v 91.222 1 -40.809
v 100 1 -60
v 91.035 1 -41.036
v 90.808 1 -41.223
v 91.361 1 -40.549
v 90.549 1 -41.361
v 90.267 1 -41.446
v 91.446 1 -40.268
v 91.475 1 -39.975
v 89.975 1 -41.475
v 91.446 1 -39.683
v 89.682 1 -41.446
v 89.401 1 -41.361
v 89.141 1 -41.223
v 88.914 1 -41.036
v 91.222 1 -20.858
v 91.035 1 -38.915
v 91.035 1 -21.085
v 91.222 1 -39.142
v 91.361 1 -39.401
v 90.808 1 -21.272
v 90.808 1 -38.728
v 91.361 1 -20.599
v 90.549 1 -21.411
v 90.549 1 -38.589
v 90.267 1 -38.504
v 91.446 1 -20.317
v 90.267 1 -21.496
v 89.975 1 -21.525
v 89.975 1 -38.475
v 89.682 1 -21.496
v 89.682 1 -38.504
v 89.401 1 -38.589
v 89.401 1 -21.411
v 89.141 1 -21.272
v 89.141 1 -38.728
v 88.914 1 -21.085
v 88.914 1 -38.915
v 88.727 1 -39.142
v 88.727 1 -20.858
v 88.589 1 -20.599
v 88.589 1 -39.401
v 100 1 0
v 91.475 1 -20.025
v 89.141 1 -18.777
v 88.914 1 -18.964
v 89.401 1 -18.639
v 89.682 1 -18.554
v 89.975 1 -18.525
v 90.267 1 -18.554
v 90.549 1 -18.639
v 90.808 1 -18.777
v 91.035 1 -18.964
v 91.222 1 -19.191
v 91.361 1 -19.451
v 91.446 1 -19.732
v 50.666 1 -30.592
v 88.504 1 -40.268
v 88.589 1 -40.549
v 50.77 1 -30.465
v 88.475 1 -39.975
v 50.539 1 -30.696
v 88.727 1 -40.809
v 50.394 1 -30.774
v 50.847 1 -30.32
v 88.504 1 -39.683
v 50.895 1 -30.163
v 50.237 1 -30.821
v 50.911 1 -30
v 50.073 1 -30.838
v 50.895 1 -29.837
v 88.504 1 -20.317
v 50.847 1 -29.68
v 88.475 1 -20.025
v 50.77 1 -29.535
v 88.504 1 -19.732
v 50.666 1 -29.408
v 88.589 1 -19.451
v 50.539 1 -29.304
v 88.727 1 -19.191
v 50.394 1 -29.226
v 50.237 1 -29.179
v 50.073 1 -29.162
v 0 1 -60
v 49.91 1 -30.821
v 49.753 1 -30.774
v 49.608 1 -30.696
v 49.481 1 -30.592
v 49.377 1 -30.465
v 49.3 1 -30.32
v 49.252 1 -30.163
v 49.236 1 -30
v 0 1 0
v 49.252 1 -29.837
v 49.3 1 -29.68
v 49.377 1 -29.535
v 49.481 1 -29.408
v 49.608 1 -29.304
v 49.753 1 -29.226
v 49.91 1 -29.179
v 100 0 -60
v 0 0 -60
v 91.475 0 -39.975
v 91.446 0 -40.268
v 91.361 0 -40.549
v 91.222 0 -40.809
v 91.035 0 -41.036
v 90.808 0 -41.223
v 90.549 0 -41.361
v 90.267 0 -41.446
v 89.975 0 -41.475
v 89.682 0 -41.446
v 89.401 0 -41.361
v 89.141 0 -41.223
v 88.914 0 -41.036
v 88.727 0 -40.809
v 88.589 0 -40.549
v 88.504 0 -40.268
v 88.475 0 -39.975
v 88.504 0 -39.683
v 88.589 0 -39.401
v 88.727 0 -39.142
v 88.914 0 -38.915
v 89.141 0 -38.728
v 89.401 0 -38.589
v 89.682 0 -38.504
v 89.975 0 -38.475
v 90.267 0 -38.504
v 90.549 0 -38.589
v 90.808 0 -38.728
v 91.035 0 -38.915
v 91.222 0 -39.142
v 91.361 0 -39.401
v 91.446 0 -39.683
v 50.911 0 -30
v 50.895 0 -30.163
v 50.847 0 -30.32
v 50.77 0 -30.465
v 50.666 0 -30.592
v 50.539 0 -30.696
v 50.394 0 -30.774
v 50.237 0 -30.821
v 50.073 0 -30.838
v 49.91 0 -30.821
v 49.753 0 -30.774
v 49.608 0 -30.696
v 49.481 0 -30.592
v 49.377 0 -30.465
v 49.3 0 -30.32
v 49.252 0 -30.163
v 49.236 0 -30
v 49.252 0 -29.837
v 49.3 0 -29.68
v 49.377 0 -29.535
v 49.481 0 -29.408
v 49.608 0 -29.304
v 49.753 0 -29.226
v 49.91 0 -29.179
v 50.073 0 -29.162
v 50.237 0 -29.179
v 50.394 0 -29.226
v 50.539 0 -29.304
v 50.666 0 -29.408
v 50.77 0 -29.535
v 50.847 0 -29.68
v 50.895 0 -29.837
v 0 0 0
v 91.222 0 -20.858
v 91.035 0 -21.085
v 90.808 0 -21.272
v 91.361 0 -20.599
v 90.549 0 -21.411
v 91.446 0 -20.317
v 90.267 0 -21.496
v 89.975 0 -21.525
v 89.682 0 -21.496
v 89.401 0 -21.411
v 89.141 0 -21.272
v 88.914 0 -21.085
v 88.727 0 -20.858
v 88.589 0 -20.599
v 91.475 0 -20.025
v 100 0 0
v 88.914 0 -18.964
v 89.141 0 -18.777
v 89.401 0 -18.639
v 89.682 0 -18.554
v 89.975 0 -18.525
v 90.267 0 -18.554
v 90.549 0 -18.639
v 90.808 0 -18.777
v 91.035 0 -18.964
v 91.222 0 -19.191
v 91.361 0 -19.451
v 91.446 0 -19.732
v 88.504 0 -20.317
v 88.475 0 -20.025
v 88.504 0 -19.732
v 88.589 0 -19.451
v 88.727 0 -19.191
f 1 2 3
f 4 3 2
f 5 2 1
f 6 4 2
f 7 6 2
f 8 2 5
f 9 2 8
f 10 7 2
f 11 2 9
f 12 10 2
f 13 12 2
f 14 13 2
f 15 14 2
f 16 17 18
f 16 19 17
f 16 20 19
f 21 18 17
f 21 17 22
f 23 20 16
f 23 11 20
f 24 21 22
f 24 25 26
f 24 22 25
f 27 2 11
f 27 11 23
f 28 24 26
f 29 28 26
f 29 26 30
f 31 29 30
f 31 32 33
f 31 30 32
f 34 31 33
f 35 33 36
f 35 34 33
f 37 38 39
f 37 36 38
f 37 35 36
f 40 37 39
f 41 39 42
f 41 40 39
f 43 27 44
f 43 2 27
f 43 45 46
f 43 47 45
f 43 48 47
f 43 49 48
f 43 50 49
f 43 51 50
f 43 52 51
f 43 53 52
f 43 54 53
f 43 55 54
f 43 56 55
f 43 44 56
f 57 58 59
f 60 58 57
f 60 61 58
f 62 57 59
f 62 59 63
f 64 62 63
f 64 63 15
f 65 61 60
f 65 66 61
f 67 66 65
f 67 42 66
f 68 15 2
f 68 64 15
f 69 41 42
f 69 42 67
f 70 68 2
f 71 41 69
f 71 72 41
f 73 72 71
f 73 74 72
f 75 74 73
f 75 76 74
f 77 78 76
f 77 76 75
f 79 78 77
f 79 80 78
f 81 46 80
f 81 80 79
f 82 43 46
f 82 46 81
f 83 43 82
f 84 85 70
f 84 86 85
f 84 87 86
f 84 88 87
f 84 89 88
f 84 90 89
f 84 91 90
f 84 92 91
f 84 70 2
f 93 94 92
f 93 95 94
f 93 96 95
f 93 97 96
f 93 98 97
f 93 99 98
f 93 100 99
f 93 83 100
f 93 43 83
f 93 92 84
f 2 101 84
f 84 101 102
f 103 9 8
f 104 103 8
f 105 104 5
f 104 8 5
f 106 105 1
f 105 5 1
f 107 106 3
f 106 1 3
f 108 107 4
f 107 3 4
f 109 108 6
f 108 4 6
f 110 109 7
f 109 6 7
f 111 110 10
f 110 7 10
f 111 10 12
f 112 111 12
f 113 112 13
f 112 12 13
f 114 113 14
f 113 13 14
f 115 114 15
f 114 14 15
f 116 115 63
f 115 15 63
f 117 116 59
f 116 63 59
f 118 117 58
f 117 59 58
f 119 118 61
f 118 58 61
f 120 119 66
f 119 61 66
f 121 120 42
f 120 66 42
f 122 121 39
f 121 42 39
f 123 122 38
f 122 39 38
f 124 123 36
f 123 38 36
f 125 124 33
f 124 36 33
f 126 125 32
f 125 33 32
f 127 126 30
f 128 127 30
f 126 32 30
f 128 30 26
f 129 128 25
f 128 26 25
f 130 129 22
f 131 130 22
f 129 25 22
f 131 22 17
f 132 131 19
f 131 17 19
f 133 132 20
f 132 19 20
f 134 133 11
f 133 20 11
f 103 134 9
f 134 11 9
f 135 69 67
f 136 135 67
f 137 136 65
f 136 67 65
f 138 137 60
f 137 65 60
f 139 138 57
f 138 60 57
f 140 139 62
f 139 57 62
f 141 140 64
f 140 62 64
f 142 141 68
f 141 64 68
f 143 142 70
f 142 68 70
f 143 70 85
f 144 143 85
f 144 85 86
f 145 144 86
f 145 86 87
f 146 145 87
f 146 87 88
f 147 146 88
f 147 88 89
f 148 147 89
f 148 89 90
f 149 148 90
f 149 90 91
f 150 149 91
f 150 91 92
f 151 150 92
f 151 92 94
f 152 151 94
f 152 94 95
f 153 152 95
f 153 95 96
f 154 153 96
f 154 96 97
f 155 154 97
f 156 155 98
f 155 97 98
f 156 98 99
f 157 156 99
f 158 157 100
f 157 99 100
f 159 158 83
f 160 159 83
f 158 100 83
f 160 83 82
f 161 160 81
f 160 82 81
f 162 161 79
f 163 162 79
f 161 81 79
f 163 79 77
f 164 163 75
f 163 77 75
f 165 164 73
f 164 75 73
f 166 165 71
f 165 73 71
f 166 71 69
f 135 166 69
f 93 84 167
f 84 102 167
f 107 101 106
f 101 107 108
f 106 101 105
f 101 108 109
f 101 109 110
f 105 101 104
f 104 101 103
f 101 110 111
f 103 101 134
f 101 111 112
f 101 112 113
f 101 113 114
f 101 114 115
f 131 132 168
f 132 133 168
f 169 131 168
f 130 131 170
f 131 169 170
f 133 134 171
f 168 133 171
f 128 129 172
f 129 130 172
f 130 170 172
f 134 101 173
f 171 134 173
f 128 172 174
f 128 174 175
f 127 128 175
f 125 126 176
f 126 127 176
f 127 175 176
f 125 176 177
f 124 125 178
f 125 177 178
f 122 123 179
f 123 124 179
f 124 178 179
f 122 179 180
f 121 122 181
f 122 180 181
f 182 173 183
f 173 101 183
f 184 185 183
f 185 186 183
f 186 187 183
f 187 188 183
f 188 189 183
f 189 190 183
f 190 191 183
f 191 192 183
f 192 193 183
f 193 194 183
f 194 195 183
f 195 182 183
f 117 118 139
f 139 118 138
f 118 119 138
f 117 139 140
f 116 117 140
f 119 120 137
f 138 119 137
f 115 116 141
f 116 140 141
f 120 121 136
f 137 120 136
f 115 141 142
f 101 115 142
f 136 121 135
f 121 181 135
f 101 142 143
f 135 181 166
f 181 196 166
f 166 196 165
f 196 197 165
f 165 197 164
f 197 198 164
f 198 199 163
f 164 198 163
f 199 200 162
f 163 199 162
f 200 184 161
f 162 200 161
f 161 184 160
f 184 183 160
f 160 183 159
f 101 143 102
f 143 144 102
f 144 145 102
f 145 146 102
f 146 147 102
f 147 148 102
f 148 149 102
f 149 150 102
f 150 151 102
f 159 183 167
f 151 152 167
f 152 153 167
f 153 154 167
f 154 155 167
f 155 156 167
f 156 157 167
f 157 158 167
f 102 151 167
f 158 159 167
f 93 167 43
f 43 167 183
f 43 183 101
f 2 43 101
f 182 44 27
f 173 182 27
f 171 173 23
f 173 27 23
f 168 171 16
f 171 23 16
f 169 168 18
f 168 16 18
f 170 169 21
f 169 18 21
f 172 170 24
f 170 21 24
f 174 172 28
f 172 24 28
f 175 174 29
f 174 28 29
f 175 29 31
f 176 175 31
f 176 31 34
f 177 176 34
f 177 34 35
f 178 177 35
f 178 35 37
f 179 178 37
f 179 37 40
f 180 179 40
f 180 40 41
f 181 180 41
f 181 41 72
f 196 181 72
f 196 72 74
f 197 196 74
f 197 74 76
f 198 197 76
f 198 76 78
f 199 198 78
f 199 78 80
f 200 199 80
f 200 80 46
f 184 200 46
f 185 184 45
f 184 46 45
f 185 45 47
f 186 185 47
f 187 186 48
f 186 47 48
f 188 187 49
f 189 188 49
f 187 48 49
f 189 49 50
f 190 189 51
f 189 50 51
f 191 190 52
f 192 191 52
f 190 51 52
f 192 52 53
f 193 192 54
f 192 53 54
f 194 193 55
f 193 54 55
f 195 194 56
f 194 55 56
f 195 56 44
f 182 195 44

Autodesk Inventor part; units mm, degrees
ref_plane "YZ Plane" through (0, 0, 0) normal (1, 0, 0) x (0, 1, 0)
ref_plane "XZ Plane" through (0, 0, 0) normal (0, 1, 0) x (-1, 0, 0)
ref_plane "XY Plane" through (0, 0, 0) normal (0, 0, 1) x (1, 0, 0)
sketch "Sketch1" plane through (0, 0, 0) normal (0, 1, 0) x (-1, 0, 0)
  line L0 (0, 0) -> (-100, 0)
  line L1 (-100, 0) -> (-100, -60)
  line L2 (-100, -60) -> (0, -60)
  line L3 (0, -60) -> (0, 0)
  dimension "d0" = 100
  dimension "d1" = 60
extrude "Extrusion1" add sketch "Sketch1" along normal blind 1
sketch "Sketch2" plane through (0, 1, 0) normal (0, 1, 0) x (1, 0, 0)
  circle A0 centre (89.9747, 39.9753) radius 1.5
  circle A1 centre (89.9747, 20.0247) radius 1.5
  circle A2 centre (50.0733, 30) radius 0.8375
  point P0 (0, 0)
  dimension "d4" = 3
  dimension "d5" = 3
  dimension "d6" = 1.675
extrude "Extrusion2" cut sketch "Sketch2" against normal blind 1
properties part number "anglechange"
